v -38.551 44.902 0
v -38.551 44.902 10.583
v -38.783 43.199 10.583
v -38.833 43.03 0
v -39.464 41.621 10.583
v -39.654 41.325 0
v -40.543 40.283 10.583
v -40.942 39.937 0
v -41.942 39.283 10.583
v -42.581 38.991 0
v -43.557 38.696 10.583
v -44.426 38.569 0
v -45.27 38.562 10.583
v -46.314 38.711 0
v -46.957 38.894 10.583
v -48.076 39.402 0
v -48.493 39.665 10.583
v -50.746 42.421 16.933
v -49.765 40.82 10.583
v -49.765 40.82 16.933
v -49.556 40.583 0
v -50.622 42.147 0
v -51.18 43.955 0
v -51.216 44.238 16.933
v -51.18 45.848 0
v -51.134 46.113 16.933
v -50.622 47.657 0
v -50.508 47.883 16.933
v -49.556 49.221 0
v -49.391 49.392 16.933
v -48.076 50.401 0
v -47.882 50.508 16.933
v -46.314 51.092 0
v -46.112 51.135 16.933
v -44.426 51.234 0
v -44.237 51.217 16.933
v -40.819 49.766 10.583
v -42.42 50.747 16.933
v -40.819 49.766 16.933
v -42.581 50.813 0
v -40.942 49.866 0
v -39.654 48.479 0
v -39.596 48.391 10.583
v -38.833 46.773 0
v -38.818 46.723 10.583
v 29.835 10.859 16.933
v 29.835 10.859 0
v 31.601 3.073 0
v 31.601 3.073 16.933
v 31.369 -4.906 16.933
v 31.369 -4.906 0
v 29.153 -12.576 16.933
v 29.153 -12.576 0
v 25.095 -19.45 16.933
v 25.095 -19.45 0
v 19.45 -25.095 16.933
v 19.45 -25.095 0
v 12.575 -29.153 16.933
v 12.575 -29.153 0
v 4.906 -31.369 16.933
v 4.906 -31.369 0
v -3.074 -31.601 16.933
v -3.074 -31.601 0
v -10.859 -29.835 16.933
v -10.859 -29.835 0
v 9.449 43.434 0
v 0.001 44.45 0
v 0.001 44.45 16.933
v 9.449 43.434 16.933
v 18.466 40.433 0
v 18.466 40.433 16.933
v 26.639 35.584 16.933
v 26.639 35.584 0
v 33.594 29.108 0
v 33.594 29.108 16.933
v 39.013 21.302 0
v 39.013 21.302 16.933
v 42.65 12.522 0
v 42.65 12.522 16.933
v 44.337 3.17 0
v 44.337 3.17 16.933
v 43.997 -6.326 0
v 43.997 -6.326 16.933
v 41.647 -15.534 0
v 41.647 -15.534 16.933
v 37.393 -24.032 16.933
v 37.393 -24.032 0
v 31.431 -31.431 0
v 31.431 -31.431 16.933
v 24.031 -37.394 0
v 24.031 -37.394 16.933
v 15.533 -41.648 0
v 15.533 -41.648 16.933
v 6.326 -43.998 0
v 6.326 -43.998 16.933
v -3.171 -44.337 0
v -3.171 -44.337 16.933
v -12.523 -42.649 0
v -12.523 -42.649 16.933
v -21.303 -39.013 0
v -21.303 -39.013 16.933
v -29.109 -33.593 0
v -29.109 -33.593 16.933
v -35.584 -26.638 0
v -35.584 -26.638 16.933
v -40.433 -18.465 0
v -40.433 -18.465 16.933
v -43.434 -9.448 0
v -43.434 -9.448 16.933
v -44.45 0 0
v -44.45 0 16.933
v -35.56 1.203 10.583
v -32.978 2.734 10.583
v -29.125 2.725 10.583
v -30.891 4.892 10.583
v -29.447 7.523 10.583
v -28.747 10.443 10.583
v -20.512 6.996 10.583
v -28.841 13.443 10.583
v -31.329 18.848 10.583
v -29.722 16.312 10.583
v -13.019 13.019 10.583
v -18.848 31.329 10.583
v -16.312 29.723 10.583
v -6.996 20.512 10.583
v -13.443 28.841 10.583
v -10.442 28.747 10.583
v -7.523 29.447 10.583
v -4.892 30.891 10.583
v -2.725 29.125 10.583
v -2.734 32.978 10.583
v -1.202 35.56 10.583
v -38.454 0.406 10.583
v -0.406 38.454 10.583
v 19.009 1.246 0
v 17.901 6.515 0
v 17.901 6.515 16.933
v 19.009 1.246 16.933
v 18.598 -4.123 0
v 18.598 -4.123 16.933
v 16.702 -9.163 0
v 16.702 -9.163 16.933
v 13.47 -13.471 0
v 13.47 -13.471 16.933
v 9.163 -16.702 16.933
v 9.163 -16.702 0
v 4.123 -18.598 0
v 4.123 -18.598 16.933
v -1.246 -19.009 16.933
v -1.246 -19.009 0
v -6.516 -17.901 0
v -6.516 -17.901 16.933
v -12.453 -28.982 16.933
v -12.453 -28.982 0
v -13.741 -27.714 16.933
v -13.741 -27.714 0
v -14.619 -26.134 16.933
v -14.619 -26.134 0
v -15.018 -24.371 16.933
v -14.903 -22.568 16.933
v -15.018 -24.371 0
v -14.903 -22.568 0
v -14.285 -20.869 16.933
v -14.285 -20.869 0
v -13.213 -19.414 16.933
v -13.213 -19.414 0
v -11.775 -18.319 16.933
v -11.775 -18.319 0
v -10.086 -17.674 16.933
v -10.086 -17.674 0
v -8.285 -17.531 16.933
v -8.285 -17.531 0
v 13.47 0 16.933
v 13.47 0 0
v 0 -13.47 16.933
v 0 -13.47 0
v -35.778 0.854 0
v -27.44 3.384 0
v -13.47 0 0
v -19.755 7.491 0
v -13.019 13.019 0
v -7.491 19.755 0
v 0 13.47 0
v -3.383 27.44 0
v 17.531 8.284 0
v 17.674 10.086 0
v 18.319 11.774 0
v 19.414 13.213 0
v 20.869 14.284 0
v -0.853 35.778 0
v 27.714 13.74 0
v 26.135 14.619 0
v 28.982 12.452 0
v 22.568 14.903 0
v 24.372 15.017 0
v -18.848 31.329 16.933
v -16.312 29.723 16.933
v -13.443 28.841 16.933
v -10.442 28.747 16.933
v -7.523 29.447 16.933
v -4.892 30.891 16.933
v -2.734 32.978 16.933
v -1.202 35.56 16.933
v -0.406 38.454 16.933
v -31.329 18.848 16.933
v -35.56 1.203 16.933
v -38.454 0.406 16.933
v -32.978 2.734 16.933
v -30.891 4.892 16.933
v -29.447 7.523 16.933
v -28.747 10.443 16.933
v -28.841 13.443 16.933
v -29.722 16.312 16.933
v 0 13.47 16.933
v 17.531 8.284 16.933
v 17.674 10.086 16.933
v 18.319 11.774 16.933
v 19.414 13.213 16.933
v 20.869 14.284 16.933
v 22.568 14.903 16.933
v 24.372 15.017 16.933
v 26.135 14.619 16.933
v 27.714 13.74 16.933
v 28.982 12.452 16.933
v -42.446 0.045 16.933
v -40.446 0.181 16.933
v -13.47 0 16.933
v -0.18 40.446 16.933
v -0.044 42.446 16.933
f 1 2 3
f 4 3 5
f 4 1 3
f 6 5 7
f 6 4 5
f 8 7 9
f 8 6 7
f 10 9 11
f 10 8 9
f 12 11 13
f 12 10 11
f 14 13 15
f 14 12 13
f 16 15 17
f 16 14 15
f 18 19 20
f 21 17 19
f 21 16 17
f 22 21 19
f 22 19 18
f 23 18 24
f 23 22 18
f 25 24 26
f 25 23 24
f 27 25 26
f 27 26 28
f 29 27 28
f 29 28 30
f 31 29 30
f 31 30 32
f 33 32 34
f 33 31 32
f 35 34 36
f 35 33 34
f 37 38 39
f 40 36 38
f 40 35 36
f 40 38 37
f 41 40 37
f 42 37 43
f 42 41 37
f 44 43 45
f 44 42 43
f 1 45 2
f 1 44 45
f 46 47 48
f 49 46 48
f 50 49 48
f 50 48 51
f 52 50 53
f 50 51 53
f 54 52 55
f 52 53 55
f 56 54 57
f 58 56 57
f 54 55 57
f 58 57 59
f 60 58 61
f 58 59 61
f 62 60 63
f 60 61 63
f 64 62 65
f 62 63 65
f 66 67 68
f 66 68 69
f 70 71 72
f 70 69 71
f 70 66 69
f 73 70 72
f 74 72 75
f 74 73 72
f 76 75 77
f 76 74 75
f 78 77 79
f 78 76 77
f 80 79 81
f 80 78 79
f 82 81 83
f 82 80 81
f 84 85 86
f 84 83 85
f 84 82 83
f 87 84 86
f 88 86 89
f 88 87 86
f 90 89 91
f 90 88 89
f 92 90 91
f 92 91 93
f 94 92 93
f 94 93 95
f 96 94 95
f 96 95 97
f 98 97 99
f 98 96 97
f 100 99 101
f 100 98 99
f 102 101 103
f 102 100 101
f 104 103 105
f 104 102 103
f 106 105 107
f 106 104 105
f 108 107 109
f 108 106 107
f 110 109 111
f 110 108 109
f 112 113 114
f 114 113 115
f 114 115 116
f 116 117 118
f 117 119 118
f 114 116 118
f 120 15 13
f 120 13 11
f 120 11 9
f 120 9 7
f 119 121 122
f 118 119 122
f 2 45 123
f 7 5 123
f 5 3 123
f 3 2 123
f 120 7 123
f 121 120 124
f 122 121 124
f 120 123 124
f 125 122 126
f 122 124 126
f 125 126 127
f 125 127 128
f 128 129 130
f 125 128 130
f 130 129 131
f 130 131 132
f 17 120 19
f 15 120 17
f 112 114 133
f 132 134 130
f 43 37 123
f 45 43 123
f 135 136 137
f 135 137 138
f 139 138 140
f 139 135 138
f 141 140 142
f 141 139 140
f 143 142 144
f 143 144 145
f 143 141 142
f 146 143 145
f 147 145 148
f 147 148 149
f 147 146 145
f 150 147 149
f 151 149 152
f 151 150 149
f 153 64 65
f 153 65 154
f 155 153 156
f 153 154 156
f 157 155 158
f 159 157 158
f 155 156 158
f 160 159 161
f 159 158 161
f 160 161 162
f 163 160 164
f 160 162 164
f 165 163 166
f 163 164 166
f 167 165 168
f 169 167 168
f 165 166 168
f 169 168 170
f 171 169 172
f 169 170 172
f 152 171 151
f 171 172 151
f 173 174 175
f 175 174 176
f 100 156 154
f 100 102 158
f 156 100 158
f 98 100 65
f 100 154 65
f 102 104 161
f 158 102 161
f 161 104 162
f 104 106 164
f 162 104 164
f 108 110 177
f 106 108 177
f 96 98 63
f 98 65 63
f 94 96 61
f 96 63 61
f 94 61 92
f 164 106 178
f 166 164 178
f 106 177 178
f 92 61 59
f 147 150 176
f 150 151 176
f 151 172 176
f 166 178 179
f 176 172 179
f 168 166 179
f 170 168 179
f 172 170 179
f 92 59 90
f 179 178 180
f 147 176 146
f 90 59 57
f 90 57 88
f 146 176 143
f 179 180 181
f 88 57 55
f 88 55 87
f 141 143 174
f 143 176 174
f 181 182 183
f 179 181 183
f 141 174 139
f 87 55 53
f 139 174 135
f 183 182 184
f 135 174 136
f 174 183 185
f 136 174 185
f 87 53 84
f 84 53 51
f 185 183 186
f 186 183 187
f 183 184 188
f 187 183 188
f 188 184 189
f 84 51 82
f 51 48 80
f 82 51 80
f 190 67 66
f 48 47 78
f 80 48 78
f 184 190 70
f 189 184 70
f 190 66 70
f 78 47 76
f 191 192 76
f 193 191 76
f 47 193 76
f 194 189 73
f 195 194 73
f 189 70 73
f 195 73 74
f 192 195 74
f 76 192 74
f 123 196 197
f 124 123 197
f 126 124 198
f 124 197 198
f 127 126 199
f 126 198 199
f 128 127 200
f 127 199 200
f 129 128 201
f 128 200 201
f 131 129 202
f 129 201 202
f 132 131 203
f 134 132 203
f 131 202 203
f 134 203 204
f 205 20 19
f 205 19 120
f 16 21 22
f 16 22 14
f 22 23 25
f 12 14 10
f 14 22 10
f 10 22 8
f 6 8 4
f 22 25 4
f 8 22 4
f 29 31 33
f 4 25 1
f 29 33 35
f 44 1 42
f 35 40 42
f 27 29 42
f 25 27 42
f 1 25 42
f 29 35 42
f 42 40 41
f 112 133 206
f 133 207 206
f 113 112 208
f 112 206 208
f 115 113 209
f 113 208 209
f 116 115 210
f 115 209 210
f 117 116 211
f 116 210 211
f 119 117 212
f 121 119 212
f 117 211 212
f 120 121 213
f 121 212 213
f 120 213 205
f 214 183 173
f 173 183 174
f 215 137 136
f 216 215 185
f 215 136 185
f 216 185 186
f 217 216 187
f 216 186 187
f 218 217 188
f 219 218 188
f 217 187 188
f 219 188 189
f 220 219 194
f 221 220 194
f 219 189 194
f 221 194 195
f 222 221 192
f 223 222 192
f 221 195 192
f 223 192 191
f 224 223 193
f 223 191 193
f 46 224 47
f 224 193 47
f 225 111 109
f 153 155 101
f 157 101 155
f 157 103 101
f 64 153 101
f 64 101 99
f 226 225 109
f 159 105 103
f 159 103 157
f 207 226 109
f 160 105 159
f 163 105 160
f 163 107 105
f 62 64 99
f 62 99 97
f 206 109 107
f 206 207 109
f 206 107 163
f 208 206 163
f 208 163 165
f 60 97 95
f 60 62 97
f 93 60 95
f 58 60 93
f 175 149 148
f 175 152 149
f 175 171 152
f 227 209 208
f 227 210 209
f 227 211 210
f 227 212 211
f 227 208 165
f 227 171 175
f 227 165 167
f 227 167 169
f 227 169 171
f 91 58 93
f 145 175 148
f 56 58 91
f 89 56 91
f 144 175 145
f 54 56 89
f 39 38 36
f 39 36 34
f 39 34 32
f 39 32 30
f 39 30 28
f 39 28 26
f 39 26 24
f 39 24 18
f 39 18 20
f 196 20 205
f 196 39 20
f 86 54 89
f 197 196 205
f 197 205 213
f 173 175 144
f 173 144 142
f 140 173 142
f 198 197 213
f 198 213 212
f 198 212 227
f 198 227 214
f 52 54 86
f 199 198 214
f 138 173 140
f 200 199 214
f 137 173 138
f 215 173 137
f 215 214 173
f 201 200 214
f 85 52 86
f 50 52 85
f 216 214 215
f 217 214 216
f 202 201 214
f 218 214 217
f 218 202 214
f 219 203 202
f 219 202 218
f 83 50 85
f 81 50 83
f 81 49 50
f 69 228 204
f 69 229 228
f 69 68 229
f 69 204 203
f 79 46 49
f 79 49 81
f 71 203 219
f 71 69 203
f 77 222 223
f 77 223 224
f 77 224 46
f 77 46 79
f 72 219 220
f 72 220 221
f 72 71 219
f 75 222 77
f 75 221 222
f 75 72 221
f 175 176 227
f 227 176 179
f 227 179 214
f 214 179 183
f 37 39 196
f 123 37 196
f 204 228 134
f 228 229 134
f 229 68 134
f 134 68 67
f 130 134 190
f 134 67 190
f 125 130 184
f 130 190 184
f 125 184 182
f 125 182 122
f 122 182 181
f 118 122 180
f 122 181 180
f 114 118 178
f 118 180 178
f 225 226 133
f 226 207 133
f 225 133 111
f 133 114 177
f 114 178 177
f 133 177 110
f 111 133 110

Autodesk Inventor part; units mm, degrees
ref_plane "YZ Plane" through (0, 0, 0) normal (1, 0, 0) x (0, 1, 0)
ref_plane "XZ Plane" through (0, 0, 0) normal (0, 1, 0) x (-1, 0, 0)
ref_plane "XY Plane" through (0, 0, 0) normal (0, 0, 1) x (1, 0, 0)
sketch "Sketch1" plane through (0, 0, 0) normal (0, 0, 1) x (1, 0, 0)
  line L0 (0, 0) -> (-89.8017, 0) construction
  line L1 (-89.8017, 0) -> (-44.9009, 44.9017) construction
  line L2 (-44.9009, 44.9017) -> (0, 0) construction
  arc A0 (-44.45, 0) -> (0.0009, 44.45) centre (0, 0) ccw
  line L3 (-44.45, 0) -> (-44.45, 44.4509) construction
  line L4 (-44.45, 44.4509) -> (-44.9009, 44.9017) construction
  circle A1 centre (-44.9009, 44.9017) radius 6.35
  arc A2 (-44.45, 0) -> (0.0009, 44.45) centre (-44.45, 44.4509) ccw
  line L5 (0.0001, 13.4704) -> (13.4704, -0.0001)
  line L6 (13.4704, -0.0001) -> (-0.0001, -13.4704)
  line L7 (-0.0001, -13.4704) -> (-13.4704, 0.0001)
  line L8 (-13.4704, 0.0001) -> (0.0001, 13.4704)
  point P0 (-6.7351, 6.7353)
  dimension "d8" = 89.8017
  dimension "d9" = 63.5
  dimension "d10" = 63.5
  dimension "d11" = 44.45
  dimension "d12" = 12.7
  dimension "d84" = 19.05
extrude "Extrusion1" add sketch "Sketch1" along normal blind 16.9333
sketch "Sketch21" plane through (-44.9009, 44.9017, 16.9333) normal (0, 0, 1) x (1, 0, 0)
  circle A0 centre (0, 0) radius 6.35 projected
  line L0 (4.0817, 4.8643) -> (26.0532, -13.5723)
  arc A1 (0.4509, -44.9017) -> (44.9017, -0.4517) centre (0.4509, -0.4509) ccw projected
  line L1 (-4.8644, -4.0817) -> (13.5718, -26.0535)
  circle A2 centre (0, 0) radius 6.35 projected
  line L2 (31.882, -31.8827) -> (26.0532, -13.5723) construction
  line L3 (31.882, -31.8827) -> (13.5718, -26.0535) construction
  arc A3 (6.4466, -44.4955) -> (13.5718, -26.0535) centre (4.9239, -33.3098) ccw
  arc A4 (26.0532, -13.5723) -> (44.4954, -6.4475) centre (33.3097, -4.9246) ccw
  line L4 (0, 0) -> (31.882, -31.8827) construction
  line L5 (13.5718, -26.0535) -> (15.941, -15.9413) construction
  line L6 (15.941, -15.9413) -> (26.0532, -13.5723) construction
  point P0 (44.9009, -44.9017)
  dimension "d85" = 10
  dimension "d86" = 11.2889
extrude "Extrusion18" add sketch "Sketch21" against normal blind 6.35 contours A0 L0 A4 A1 A3 L1
sketch "Sketch22" plane through (0, 0, 0) normal (0, 0, -1) x (-1, 0, 0)
  arc A0 (-17.9012, 6.5153) -> (6.5157, -17.9011) centre (0, 0) ccw
  arc A1 (-29.8353, 10.8589) -> (10.8594, -29.8351) centre (0, 0) ccw
  line L0 (10.8594, -29.8351) -> (6.5157, -17.9011)
  line L1 (-29.8353, 10.8589) -> (-17.9012, 6.5153)
  circle A2 centre (44.9009, 44.9017) radius 6.35 construction
  line L2 (6.5157, -17.9011) -> (44.9009, 44.9017) construction
  line L3 (44.9009, 44.9017) -> (-17.9012, 6.5153) construction
  arc A3 (-17.9012, 6.5153) -> (-29.8353, 10.8589) centre (-23.8683, 8.6871) ccw
  arc A4 (10.8594, -29.8351) -> (6.5157, -17.9011) centre (8.6875, -23.8681) ccw
  dimension "d89" = 19.05
  dimension "d90" = 12.7
  dimension "d91" = 130
extrude "Extrusion19" cut sketch "Sketch22" against normal through all
properties part number "Geneva Drive" material "ABS Plastic"
